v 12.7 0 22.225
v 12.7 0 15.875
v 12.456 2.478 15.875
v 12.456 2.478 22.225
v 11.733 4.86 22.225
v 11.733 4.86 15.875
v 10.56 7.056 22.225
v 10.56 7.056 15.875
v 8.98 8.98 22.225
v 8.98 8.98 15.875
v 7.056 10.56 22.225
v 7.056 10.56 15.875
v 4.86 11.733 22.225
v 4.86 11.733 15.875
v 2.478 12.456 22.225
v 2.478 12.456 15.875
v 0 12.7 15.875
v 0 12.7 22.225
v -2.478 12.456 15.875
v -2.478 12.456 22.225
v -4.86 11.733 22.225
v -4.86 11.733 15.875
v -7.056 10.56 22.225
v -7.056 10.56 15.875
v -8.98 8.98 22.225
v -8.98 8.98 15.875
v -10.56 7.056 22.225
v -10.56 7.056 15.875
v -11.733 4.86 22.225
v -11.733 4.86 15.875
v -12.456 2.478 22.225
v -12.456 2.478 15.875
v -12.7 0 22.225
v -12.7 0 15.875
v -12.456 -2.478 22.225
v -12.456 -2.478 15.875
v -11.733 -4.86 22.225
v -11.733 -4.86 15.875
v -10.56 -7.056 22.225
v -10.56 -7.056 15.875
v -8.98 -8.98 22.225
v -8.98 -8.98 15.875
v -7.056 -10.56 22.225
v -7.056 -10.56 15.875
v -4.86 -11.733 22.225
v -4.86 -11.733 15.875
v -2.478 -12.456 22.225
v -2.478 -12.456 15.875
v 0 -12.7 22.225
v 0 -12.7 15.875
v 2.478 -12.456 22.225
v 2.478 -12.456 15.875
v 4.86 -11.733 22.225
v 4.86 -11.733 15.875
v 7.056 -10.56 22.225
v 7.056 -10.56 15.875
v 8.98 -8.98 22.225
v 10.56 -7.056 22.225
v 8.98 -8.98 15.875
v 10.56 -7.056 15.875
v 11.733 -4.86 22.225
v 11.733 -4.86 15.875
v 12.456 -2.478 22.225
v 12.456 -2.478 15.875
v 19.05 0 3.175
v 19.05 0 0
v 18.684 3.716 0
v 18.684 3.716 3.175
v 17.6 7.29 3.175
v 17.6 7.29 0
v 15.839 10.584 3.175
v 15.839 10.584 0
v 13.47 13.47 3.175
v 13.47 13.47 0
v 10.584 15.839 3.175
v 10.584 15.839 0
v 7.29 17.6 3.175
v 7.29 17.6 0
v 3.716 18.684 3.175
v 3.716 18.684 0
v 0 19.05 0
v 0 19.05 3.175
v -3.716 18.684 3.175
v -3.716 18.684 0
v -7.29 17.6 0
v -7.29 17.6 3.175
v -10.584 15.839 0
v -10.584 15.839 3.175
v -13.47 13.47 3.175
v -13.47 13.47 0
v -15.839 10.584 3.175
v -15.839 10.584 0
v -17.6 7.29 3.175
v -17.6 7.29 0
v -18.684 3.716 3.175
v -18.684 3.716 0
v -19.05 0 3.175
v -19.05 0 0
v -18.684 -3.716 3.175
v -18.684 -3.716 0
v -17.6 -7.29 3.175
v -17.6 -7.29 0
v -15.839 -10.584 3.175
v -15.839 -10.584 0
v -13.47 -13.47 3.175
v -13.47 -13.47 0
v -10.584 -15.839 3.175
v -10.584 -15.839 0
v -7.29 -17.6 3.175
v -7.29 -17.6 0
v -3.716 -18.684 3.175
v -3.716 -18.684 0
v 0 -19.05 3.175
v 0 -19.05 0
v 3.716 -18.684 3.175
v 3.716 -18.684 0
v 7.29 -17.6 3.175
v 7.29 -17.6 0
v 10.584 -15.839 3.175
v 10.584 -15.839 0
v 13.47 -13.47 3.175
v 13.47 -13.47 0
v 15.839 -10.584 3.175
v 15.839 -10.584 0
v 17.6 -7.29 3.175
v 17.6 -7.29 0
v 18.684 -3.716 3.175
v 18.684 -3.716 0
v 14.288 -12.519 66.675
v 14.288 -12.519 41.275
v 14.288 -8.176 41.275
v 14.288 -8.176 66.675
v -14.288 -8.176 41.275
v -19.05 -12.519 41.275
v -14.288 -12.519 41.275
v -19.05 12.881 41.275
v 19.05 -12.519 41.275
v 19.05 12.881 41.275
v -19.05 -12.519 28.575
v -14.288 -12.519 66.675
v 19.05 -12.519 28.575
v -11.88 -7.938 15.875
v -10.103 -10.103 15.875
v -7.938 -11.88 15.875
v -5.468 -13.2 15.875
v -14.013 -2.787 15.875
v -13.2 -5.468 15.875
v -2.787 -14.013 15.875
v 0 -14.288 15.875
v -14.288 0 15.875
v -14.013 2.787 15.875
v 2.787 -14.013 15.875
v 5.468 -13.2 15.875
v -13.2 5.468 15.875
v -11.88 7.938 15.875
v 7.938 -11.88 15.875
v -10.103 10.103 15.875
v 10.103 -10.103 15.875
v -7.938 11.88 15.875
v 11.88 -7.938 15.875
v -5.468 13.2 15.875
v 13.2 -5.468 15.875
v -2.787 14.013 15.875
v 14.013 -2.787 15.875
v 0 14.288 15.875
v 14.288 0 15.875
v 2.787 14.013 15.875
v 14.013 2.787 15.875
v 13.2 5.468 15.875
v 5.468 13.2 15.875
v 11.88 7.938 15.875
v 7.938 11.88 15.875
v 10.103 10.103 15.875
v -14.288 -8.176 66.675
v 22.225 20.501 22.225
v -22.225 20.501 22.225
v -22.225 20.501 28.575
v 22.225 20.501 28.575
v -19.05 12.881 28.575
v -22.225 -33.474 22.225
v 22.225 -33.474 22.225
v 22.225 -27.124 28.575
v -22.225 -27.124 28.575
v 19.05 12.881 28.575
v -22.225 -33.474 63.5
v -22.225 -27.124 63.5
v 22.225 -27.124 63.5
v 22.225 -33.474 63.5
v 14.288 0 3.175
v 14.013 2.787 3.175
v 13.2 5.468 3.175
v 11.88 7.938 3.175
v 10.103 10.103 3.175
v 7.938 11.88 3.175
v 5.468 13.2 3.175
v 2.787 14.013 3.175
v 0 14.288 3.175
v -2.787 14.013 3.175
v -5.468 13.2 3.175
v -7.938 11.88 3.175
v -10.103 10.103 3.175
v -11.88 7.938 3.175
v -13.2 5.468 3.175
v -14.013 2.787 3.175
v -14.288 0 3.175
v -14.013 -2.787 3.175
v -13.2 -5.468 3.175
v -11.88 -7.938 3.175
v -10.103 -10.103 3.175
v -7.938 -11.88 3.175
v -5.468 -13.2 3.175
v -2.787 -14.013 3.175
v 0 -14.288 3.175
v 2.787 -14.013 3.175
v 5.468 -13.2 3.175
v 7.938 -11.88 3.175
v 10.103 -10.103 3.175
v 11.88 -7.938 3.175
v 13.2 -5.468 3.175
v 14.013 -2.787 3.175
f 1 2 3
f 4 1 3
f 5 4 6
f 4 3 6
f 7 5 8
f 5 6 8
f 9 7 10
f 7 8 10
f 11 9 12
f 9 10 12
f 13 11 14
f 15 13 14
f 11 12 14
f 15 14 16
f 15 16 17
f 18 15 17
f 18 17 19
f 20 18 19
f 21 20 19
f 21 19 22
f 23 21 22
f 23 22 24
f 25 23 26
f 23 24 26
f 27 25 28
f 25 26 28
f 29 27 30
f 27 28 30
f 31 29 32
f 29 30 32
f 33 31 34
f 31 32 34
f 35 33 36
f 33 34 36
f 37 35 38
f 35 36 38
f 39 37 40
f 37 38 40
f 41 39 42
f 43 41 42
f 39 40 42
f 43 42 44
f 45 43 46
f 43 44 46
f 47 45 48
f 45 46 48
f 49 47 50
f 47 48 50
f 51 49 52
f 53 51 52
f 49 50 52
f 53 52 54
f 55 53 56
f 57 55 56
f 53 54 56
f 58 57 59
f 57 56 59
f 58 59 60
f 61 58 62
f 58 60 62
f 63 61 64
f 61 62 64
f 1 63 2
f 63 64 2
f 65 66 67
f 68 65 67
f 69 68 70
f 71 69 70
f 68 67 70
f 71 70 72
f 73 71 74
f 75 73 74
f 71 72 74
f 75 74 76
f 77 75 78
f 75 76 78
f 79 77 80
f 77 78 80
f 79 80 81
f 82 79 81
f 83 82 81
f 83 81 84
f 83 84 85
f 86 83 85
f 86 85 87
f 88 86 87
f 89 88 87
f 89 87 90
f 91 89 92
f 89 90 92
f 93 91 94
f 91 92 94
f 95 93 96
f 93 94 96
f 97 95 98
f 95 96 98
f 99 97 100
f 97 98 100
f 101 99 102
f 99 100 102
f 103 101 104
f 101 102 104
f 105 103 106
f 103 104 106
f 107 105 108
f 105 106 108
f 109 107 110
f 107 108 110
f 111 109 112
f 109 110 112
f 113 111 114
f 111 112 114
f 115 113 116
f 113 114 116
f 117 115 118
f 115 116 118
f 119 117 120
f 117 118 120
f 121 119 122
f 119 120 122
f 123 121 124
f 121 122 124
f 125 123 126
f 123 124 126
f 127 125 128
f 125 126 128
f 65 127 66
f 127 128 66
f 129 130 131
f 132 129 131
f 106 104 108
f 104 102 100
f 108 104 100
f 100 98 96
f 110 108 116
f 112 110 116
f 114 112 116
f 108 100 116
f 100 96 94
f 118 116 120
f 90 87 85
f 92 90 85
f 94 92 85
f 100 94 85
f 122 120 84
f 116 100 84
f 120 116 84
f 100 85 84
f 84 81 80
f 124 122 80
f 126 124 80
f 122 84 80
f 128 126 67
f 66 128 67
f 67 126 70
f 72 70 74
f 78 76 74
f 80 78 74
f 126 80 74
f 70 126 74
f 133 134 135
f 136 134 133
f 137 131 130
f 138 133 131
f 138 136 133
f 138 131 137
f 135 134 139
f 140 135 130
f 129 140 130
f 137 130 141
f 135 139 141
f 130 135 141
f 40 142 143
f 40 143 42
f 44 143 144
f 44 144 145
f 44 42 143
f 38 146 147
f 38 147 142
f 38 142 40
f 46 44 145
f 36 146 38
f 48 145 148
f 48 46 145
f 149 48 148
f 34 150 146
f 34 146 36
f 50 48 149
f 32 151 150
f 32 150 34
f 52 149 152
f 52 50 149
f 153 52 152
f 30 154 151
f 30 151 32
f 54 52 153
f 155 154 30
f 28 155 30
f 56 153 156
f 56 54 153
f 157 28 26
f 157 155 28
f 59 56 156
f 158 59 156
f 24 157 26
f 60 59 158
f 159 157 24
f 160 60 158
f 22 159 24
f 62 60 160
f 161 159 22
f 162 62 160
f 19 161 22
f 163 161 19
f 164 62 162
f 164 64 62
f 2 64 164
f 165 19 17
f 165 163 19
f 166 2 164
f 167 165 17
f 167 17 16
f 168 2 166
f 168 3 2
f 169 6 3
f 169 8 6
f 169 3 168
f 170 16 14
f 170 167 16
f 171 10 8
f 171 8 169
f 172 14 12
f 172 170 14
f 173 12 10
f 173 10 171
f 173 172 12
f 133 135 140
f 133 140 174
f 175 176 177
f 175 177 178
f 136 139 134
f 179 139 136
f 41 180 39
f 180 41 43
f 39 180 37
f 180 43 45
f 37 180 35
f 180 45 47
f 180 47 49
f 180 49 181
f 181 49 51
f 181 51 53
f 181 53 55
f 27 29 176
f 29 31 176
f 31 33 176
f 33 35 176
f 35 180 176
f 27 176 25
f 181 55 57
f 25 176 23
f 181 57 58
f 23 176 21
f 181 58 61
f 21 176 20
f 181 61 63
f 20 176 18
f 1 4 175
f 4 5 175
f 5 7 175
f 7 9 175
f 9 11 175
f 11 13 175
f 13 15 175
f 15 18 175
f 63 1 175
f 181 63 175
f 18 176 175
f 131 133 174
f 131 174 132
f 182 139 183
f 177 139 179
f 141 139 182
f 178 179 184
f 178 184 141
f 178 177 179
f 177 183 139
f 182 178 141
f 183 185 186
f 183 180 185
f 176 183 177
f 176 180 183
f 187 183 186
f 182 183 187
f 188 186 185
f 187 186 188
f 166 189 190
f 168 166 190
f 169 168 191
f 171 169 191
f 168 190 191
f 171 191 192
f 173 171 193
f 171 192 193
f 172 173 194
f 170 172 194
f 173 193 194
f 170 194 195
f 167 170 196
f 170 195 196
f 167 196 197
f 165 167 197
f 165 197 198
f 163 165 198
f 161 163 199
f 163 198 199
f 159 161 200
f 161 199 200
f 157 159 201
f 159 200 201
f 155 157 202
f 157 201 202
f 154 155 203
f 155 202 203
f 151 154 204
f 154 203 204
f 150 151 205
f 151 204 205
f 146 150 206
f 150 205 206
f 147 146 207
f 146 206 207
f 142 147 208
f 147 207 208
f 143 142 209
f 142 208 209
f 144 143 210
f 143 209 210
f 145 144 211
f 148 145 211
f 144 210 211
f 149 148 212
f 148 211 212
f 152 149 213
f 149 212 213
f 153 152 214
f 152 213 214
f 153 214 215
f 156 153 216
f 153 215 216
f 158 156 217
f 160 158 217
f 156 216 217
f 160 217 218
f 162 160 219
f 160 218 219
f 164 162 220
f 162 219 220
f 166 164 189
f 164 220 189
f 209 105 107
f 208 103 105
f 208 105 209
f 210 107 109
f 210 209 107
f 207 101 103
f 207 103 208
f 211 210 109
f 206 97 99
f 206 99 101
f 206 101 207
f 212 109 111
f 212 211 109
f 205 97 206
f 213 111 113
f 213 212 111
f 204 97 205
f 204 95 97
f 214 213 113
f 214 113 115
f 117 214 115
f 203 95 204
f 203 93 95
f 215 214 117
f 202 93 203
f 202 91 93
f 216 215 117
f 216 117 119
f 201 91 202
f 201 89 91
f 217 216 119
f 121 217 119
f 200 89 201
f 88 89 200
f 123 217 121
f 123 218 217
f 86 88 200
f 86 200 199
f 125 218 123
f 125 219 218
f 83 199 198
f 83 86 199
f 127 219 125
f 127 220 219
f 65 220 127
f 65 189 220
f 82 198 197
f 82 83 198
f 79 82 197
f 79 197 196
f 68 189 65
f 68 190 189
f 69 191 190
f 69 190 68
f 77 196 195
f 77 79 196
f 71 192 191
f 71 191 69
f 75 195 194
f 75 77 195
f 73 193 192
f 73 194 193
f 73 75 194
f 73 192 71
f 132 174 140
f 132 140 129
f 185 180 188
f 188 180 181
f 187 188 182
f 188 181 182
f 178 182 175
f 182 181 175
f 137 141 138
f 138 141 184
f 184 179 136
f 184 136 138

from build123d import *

# Parameters (mm, degrees)
SKETCH1_R           = 19.05
BOSS_EXTRUDE2_DEPTH = 3.175
SKETCH2_R           = 14.2875
BOSS_EXTRUDE3_DEPTH = 12.7
SKETCH5_R           = 12.7
BOSS_EXTRUDE4_DEPTH = 6.35
SKETCH6_W           = 44.45
SKETCH6_H           = 53.975
BOSS_EXTRUDE5_DEPTH = 6.35
SKETCH7_W           = 44.45
SKETCH7_H           = 6.35
BOSS_EXTRUDE6_DEPTH = 34.925
SKETCH8_W           = 38.1
SKETCH8_H           = 25.4
BOSS_EXTRUDE7_DEPTH = 12.7
SKETCH9_W           = 28.575
SKETCH9_H           = 4.343134019
BOSS_EXTRUDE9_DEPTH = 25.4


with BuildPart() as part:
    # Sketch1 → Boss-Extrude2 (new body)
    with BuildSketch(Plane.XY):
        Circle(SKETCH1_R)
    extrude(amount=BOSS_EXTRUDE2_DEPTH)

    # Sketch2 → Boss-Extrude3 (add)
    with BuildSketch(Plane.XY.offset(3.175)):
        Circle(SKETCH2_R)
    extrude(amount=BOSS_EXTRUDE3_DEPTH)

    # Sketch5 → Boss-Extrude4 (add)
    with BuildSketch(Plane.XY.offset(15.875)):
        Circle(SKETCH5_R)
    extrude(amount=BOSS_EXTRUDE4_DEPTH)

    # Sketch6 → Boss-Extrude5 (add)
    with BuildSketch(Plane.XY.offset(22.225)):
        with Locations((0, -6.486273282)):
            Rectangle(SKETCH6_W, SKETCH6_H)
    extrude(amount=BOSS_EXTRUDE5_DEPTH)

    # Sketch7 → Boss-Extrude6 (add)
    with BuildSketch(Plane.XY.offset(28.575)):
        with Locations((0, -30.298773282)):
            Rectangle(SKETCH7_W, SKETCH7_H)
    extrude(amount=BOSS_EXTRUDE6_DEPTH)

    # Sketch8 → Boss-Extrude7 (add)
    with BuildSketch(Plane.XY.offset(28.575)):
        with Locations((0, 0.181226718)):
            Rectangle(SKETCH8_W, SKETCH8_H)
    extrude(amount=BOSS_EXTRUDE7_DEPTH)

    # Sketch9 → Boss-Extrude9 (add)
    with BuildSketch(Plane.XY.offset(41.275)):
        with Locations((0, -10.347206273)):
            Rectangle(SKETCH9_W, SKETCH9_H)
    extrude(amount=BOSS_EXTRUDE9_DEPTH)


solid = part.part
